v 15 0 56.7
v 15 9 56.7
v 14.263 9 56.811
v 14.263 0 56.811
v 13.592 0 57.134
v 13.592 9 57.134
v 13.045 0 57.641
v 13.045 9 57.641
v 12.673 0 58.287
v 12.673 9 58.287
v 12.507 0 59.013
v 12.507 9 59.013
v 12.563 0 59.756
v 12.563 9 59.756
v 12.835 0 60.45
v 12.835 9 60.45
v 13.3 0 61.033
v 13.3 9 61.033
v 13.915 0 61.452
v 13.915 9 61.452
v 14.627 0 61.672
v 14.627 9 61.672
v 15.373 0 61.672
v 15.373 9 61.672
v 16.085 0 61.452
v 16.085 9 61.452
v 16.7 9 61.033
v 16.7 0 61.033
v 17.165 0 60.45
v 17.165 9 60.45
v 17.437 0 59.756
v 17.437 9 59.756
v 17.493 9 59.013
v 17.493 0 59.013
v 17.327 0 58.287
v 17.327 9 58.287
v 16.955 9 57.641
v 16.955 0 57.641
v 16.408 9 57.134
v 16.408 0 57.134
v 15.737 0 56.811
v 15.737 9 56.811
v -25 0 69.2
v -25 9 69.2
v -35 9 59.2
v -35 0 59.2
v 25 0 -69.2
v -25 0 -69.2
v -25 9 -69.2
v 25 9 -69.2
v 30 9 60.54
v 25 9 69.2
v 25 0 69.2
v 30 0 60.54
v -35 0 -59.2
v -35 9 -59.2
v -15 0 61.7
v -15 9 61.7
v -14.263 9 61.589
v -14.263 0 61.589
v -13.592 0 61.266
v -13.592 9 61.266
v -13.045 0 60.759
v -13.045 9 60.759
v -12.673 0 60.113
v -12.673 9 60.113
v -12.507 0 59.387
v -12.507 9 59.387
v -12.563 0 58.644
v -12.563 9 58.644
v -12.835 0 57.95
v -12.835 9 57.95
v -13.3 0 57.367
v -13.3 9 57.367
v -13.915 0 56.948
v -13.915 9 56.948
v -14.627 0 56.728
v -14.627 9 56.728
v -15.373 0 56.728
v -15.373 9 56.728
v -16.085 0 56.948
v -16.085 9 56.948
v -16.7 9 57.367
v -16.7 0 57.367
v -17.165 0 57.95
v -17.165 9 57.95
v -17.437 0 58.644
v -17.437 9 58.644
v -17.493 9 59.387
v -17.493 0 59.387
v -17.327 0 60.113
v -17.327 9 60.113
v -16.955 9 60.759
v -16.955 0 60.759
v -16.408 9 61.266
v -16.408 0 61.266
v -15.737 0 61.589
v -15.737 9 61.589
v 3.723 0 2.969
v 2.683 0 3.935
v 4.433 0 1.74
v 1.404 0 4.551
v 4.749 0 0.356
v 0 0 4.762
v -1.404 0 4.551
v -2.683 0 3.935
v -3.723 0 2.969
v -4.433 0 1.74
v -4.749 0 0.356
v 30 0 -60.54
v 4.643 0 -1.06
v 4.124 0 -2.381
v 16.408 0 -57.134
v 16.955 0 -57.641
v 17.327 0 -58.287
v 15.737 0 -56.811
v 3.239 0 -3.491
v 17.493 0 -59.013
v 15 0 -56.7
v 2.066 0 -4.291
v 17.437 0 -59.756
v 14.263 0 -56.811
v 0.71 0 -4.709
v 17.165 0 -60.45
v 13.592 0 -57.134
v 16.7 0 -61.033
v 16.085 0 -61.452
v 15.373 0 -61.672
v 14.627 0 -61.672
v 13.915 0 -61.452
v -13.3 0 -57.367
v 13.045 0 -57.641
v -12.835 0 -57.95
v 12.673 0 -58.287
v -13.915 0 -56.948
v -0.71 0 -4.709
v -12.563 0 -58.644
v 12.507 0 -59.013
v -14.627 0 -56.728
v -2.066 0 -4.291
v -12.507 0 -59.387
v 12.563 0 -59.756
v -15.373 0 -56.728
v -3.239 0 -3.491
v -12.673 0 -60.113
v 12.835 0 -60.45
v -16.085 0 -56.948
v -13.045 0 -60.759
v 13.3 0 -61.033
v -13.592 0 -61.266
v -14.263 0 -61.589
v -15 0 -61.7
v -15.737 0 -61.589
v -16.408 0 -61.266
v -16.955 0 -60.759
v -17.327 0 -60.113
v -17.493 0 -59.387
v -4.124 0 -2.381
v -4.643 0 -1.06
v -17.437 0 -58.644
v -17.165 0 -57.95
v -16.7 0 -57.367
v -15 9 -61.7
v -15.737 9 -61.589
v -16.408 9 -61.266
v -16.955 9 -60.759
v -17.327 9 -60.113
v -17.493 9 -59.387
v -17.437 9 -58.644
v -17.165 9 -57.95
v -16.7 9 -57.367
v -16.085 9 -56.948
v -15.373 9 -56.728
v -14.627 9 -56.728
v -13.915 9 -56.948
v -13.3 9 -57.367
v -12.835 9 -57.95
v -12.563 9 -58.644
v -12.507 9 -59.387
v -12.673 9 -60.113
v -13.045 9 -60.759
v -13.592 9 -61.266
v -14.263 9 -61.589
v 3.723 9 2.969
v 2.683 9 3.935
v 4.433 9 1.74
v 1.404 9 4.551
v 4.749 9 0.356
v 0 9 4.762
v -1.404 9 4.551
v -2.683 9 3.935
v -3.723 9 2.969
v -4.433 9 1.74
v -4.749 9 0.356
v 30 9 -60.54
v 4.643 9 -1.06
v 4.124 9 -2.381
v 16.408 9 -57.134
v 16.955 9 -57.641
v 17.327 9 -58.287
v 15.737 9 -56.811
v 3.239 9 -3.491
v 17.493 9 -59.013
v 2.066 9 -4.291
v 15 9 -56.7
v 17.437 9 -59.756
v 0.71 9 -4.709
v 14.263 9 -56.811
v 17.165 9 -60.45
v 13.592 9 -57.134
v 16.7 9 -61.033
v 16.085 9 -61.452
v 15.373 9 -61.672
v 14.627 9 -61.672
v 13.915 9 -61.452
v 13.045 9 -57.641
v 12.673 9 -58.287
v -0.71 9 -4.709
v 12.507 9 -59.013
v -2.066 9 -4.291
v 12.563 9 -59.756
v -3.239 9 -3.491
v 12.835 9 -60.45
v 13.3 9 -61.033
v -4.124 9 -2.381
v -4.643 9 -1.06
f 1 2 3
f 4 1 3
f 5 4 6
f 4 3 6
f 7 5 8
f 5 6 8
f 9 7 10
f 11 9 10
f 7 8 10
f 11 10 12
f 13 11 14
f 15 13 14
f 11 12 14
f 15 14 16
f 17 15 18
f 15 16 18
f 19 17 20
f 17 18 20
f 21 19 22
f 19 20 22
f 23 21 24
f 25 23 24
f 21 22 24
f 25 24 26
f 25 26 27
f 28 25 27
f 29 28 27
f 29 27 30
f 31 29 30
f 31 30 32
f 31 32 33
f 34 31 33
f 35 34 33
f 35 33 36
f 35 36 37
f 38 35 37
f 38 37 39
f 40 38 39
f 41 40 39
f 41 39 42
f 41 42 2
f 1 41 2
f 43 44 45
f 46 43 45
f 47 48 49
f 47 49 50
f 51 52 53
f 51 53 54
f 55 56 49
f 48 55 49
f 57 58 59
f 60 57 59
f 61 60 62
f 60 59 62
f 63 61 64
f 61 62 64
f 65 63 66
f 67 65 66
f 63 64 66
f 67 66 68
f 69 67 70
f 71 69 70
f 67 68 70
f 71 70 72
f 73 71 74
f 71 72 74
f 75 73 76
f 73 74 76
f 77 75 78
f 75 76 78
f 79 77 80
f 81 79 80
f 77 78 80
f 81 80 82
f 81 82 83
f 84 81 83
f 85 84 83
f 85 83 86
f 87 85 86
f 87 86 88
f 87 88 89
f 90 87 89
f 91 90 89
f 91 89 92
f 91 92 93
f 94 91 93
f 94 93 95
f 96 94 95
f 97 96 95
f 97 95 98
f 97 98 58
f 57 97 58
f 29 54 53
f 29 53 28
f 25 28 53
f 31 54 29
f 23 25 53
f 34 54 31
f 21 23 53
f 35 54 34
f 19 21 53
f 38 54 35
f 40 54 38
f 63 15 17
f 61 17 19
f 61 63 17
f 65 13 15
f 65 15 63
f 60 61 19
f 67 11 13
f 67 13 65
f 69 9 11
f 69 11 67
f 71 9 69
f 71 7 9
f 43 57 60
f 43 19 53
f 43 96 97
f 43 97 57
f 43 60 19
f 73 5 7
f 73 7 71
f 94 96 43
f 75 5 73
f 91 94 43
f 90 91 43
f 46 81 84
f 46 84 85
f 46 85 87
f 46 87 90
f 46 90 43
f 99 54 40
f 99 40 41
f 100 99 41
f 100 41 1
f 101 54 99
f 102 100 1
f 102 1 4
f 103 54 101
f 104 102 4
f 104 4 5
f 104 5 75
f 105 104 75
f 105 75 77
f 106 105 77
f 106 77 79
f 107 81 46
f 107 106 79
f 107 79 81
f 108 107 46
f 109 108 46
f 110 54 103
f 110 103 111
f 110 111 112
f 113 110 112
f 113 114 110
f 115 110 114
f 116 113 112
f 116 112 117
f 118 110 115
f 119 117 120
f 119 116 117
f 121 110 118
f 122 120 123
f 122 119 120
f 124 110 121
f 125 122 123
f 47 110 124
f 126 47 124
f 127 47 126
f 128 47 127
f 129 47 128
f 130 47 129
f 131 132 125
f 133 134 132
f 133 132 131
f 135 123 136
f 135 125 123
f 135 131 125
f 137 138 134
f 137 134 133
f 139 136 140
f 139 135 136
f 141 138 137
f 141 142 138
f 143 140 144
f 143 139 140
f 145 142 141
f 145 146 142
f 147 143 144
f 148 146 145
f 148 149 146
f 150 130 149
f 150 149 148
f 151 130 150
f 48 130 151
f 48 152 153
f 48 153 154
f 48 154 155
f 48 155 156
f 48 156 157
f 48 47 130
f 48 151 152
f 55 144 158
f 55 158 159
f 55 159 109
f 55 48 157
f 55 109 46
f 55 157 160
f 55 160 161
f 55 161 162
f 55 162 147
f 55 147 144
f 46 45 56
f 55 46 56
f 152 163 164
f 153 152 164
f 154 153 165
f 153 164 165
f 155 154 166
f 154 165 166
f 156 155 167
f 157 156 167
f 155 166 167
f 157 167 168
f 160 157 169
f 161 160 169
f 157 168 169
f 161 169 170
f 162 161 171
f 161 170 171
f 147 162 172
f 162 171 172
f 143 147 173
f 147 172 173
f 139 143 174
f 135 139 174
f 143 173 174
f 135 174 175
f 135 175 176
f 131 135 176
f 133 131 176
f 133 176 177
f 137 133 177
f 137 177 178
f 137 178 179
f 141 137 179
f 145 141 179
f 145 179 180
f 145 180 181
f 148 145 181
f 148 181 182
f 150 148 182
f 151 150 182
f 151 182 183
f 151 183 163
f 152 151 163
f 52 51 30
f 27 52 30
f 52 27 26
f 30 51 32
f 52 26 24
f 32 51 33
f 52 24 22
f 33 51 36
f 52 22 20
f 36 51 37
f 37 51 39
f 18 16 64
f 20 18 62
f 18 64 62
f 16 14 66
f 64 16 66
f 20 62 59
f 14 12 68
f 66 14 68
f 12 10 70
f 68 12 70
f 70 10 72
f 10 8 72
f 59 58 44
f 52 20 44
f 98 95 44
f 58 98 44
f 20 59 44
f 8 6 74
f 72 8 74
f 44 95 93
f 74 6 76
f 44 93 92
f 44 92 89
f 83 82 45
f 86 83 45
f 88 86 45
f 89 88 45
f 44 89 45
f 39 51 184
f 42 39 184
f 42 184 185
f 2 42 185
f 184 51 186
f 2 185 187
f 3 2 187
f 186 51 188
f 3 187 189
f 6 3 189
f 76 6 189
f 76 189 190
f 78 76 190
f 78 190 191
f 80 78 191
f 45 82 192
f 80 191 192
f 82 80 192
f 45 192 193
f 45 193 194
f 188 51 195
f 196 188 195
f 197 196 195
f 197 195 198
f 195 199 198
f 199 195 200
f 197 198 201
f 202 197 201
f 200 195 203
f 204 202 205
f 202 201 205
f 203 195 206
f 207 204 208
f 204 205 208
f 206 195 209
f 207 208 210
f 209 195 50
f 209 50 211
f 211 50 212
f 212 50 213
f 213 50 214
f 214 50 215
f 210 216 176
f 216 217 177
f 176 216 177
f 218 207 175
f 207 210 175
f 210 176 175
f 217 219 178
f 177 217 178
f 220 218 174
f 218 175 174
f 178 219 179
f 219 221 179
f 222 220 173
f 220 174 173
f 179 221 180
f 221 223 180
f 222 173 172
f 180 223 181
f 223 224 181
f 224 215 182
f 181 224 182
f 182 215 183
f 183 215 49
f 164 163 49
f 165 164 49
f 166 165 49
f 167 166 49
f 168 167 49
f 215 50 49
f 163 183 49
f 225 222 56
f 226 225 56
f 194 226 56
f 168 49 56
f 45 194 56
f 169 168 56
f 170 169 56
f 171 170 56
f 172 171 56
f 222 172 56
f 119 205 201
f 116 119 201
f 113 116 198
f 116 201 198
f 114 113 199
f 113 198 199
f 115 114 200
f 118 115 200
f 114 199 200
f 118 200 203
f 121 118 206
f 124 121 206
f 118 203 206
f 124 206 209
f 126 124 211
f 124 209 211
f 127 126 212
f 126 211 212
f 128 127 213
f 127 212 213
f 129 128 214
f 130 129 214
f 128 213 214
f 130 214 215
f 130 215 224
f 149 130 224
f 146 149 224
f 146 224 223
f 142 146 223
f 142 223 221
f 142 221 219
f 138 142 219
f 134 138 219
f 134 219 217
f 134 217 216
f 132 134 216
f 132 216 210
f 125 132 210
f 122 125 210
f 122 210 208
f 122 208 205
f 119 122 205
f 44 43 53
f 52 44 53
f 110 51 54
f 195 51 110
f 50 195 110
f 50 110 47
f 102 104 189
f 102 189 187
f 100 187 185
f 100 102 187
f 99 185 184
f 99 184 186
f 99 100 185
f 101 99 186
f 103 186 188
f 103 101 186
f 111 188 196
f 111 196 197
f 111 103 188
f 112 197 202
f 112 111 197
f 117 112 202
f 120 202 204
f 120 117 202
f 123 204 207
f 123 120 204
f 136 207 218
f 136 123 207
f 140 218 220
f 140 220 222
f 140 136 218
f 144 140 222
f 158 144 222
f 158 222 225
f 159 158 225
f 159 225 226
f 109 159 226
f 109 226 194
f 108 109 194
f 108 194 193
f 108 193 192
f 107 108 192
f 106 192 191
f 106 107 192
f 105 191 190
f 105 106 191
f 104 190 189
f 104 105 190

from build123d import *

# Parameters (mm, degrees)
CROQUIS1_W              = 50
CROQUIS1_H              = 138.4
CROQUIS1_R              = 4.7625
SALIENTE_EXTRUIR1_DEPTH = 9
CROQUIS2_R              = 2.5
CORTAR_EXTRUIR1_DEPTH   = 75.12583895
SALIENTE_EXTRUIR2_DEPTH = 9


with BuildPart() as part:
    # Croquis1 → Saliente-Extruir1 (new body)
    with BuildSketch(Plane(origin=(0, 0, 0), x_dir=(1, 0, 0), z_dir=(0, 1, 0))):
        Rectangle(CROQUIS1_W, CROQUIS1_H)
        with Locations(Location((0, 0, 0), (0, 0, 270))):
            Circle(CROQUIS1_R, mode=Mode.SUBTRACT)
    extrude(amount=SALIENTE_EXTRUIR1_DEPTH)

    # Croquis2 → Cortar-Extruir1 (cut, through all)
    with BuildSketch(Plane(origin=(0, 9, 0), x_dir=(1, 0, 0), z_dir=(0, 1, 0))):
        with Locations(Location((-15, -59.2, 0), (0, 0, 270))):
            Circle(CROQUIS2_R)
        with Locations(Location((15, -59.2, 0), (0, 0, 90))):
            Circle(CROQUIS2_R)
        with Locations(Location((15, 59.2, 0), (0, 0, 270))):
            Circle(CROQUIS2_R)
        with Locations(Location((-15, 59.2, 0), (0, 0, 90))):
            Circle(CROQUIS2_R)
    extrude(amount=-CORTAR_EXTRUIR1_DEPTH, mode=Mode.SUBTRACT)

    # Croquis3 → Saliente-Extruir2 (add)
    with BuildSketch(Plane(origin=(0, 9, 0), x_dir=(1, 0, 0), z_dir=(0, 1, 0))):
        Polygon((-25, 69.2), (-25, -69.2), (-35, -59.2), (-35, 59.2), align=None)
        Polygon((25, 69.2), (25, -69.2), (30, -60.539745962), (30, 60.539745962), align=None)
    extrude(amount=-SALIENTE_EXTRUIR2_DEPTH)


solid = part.part
